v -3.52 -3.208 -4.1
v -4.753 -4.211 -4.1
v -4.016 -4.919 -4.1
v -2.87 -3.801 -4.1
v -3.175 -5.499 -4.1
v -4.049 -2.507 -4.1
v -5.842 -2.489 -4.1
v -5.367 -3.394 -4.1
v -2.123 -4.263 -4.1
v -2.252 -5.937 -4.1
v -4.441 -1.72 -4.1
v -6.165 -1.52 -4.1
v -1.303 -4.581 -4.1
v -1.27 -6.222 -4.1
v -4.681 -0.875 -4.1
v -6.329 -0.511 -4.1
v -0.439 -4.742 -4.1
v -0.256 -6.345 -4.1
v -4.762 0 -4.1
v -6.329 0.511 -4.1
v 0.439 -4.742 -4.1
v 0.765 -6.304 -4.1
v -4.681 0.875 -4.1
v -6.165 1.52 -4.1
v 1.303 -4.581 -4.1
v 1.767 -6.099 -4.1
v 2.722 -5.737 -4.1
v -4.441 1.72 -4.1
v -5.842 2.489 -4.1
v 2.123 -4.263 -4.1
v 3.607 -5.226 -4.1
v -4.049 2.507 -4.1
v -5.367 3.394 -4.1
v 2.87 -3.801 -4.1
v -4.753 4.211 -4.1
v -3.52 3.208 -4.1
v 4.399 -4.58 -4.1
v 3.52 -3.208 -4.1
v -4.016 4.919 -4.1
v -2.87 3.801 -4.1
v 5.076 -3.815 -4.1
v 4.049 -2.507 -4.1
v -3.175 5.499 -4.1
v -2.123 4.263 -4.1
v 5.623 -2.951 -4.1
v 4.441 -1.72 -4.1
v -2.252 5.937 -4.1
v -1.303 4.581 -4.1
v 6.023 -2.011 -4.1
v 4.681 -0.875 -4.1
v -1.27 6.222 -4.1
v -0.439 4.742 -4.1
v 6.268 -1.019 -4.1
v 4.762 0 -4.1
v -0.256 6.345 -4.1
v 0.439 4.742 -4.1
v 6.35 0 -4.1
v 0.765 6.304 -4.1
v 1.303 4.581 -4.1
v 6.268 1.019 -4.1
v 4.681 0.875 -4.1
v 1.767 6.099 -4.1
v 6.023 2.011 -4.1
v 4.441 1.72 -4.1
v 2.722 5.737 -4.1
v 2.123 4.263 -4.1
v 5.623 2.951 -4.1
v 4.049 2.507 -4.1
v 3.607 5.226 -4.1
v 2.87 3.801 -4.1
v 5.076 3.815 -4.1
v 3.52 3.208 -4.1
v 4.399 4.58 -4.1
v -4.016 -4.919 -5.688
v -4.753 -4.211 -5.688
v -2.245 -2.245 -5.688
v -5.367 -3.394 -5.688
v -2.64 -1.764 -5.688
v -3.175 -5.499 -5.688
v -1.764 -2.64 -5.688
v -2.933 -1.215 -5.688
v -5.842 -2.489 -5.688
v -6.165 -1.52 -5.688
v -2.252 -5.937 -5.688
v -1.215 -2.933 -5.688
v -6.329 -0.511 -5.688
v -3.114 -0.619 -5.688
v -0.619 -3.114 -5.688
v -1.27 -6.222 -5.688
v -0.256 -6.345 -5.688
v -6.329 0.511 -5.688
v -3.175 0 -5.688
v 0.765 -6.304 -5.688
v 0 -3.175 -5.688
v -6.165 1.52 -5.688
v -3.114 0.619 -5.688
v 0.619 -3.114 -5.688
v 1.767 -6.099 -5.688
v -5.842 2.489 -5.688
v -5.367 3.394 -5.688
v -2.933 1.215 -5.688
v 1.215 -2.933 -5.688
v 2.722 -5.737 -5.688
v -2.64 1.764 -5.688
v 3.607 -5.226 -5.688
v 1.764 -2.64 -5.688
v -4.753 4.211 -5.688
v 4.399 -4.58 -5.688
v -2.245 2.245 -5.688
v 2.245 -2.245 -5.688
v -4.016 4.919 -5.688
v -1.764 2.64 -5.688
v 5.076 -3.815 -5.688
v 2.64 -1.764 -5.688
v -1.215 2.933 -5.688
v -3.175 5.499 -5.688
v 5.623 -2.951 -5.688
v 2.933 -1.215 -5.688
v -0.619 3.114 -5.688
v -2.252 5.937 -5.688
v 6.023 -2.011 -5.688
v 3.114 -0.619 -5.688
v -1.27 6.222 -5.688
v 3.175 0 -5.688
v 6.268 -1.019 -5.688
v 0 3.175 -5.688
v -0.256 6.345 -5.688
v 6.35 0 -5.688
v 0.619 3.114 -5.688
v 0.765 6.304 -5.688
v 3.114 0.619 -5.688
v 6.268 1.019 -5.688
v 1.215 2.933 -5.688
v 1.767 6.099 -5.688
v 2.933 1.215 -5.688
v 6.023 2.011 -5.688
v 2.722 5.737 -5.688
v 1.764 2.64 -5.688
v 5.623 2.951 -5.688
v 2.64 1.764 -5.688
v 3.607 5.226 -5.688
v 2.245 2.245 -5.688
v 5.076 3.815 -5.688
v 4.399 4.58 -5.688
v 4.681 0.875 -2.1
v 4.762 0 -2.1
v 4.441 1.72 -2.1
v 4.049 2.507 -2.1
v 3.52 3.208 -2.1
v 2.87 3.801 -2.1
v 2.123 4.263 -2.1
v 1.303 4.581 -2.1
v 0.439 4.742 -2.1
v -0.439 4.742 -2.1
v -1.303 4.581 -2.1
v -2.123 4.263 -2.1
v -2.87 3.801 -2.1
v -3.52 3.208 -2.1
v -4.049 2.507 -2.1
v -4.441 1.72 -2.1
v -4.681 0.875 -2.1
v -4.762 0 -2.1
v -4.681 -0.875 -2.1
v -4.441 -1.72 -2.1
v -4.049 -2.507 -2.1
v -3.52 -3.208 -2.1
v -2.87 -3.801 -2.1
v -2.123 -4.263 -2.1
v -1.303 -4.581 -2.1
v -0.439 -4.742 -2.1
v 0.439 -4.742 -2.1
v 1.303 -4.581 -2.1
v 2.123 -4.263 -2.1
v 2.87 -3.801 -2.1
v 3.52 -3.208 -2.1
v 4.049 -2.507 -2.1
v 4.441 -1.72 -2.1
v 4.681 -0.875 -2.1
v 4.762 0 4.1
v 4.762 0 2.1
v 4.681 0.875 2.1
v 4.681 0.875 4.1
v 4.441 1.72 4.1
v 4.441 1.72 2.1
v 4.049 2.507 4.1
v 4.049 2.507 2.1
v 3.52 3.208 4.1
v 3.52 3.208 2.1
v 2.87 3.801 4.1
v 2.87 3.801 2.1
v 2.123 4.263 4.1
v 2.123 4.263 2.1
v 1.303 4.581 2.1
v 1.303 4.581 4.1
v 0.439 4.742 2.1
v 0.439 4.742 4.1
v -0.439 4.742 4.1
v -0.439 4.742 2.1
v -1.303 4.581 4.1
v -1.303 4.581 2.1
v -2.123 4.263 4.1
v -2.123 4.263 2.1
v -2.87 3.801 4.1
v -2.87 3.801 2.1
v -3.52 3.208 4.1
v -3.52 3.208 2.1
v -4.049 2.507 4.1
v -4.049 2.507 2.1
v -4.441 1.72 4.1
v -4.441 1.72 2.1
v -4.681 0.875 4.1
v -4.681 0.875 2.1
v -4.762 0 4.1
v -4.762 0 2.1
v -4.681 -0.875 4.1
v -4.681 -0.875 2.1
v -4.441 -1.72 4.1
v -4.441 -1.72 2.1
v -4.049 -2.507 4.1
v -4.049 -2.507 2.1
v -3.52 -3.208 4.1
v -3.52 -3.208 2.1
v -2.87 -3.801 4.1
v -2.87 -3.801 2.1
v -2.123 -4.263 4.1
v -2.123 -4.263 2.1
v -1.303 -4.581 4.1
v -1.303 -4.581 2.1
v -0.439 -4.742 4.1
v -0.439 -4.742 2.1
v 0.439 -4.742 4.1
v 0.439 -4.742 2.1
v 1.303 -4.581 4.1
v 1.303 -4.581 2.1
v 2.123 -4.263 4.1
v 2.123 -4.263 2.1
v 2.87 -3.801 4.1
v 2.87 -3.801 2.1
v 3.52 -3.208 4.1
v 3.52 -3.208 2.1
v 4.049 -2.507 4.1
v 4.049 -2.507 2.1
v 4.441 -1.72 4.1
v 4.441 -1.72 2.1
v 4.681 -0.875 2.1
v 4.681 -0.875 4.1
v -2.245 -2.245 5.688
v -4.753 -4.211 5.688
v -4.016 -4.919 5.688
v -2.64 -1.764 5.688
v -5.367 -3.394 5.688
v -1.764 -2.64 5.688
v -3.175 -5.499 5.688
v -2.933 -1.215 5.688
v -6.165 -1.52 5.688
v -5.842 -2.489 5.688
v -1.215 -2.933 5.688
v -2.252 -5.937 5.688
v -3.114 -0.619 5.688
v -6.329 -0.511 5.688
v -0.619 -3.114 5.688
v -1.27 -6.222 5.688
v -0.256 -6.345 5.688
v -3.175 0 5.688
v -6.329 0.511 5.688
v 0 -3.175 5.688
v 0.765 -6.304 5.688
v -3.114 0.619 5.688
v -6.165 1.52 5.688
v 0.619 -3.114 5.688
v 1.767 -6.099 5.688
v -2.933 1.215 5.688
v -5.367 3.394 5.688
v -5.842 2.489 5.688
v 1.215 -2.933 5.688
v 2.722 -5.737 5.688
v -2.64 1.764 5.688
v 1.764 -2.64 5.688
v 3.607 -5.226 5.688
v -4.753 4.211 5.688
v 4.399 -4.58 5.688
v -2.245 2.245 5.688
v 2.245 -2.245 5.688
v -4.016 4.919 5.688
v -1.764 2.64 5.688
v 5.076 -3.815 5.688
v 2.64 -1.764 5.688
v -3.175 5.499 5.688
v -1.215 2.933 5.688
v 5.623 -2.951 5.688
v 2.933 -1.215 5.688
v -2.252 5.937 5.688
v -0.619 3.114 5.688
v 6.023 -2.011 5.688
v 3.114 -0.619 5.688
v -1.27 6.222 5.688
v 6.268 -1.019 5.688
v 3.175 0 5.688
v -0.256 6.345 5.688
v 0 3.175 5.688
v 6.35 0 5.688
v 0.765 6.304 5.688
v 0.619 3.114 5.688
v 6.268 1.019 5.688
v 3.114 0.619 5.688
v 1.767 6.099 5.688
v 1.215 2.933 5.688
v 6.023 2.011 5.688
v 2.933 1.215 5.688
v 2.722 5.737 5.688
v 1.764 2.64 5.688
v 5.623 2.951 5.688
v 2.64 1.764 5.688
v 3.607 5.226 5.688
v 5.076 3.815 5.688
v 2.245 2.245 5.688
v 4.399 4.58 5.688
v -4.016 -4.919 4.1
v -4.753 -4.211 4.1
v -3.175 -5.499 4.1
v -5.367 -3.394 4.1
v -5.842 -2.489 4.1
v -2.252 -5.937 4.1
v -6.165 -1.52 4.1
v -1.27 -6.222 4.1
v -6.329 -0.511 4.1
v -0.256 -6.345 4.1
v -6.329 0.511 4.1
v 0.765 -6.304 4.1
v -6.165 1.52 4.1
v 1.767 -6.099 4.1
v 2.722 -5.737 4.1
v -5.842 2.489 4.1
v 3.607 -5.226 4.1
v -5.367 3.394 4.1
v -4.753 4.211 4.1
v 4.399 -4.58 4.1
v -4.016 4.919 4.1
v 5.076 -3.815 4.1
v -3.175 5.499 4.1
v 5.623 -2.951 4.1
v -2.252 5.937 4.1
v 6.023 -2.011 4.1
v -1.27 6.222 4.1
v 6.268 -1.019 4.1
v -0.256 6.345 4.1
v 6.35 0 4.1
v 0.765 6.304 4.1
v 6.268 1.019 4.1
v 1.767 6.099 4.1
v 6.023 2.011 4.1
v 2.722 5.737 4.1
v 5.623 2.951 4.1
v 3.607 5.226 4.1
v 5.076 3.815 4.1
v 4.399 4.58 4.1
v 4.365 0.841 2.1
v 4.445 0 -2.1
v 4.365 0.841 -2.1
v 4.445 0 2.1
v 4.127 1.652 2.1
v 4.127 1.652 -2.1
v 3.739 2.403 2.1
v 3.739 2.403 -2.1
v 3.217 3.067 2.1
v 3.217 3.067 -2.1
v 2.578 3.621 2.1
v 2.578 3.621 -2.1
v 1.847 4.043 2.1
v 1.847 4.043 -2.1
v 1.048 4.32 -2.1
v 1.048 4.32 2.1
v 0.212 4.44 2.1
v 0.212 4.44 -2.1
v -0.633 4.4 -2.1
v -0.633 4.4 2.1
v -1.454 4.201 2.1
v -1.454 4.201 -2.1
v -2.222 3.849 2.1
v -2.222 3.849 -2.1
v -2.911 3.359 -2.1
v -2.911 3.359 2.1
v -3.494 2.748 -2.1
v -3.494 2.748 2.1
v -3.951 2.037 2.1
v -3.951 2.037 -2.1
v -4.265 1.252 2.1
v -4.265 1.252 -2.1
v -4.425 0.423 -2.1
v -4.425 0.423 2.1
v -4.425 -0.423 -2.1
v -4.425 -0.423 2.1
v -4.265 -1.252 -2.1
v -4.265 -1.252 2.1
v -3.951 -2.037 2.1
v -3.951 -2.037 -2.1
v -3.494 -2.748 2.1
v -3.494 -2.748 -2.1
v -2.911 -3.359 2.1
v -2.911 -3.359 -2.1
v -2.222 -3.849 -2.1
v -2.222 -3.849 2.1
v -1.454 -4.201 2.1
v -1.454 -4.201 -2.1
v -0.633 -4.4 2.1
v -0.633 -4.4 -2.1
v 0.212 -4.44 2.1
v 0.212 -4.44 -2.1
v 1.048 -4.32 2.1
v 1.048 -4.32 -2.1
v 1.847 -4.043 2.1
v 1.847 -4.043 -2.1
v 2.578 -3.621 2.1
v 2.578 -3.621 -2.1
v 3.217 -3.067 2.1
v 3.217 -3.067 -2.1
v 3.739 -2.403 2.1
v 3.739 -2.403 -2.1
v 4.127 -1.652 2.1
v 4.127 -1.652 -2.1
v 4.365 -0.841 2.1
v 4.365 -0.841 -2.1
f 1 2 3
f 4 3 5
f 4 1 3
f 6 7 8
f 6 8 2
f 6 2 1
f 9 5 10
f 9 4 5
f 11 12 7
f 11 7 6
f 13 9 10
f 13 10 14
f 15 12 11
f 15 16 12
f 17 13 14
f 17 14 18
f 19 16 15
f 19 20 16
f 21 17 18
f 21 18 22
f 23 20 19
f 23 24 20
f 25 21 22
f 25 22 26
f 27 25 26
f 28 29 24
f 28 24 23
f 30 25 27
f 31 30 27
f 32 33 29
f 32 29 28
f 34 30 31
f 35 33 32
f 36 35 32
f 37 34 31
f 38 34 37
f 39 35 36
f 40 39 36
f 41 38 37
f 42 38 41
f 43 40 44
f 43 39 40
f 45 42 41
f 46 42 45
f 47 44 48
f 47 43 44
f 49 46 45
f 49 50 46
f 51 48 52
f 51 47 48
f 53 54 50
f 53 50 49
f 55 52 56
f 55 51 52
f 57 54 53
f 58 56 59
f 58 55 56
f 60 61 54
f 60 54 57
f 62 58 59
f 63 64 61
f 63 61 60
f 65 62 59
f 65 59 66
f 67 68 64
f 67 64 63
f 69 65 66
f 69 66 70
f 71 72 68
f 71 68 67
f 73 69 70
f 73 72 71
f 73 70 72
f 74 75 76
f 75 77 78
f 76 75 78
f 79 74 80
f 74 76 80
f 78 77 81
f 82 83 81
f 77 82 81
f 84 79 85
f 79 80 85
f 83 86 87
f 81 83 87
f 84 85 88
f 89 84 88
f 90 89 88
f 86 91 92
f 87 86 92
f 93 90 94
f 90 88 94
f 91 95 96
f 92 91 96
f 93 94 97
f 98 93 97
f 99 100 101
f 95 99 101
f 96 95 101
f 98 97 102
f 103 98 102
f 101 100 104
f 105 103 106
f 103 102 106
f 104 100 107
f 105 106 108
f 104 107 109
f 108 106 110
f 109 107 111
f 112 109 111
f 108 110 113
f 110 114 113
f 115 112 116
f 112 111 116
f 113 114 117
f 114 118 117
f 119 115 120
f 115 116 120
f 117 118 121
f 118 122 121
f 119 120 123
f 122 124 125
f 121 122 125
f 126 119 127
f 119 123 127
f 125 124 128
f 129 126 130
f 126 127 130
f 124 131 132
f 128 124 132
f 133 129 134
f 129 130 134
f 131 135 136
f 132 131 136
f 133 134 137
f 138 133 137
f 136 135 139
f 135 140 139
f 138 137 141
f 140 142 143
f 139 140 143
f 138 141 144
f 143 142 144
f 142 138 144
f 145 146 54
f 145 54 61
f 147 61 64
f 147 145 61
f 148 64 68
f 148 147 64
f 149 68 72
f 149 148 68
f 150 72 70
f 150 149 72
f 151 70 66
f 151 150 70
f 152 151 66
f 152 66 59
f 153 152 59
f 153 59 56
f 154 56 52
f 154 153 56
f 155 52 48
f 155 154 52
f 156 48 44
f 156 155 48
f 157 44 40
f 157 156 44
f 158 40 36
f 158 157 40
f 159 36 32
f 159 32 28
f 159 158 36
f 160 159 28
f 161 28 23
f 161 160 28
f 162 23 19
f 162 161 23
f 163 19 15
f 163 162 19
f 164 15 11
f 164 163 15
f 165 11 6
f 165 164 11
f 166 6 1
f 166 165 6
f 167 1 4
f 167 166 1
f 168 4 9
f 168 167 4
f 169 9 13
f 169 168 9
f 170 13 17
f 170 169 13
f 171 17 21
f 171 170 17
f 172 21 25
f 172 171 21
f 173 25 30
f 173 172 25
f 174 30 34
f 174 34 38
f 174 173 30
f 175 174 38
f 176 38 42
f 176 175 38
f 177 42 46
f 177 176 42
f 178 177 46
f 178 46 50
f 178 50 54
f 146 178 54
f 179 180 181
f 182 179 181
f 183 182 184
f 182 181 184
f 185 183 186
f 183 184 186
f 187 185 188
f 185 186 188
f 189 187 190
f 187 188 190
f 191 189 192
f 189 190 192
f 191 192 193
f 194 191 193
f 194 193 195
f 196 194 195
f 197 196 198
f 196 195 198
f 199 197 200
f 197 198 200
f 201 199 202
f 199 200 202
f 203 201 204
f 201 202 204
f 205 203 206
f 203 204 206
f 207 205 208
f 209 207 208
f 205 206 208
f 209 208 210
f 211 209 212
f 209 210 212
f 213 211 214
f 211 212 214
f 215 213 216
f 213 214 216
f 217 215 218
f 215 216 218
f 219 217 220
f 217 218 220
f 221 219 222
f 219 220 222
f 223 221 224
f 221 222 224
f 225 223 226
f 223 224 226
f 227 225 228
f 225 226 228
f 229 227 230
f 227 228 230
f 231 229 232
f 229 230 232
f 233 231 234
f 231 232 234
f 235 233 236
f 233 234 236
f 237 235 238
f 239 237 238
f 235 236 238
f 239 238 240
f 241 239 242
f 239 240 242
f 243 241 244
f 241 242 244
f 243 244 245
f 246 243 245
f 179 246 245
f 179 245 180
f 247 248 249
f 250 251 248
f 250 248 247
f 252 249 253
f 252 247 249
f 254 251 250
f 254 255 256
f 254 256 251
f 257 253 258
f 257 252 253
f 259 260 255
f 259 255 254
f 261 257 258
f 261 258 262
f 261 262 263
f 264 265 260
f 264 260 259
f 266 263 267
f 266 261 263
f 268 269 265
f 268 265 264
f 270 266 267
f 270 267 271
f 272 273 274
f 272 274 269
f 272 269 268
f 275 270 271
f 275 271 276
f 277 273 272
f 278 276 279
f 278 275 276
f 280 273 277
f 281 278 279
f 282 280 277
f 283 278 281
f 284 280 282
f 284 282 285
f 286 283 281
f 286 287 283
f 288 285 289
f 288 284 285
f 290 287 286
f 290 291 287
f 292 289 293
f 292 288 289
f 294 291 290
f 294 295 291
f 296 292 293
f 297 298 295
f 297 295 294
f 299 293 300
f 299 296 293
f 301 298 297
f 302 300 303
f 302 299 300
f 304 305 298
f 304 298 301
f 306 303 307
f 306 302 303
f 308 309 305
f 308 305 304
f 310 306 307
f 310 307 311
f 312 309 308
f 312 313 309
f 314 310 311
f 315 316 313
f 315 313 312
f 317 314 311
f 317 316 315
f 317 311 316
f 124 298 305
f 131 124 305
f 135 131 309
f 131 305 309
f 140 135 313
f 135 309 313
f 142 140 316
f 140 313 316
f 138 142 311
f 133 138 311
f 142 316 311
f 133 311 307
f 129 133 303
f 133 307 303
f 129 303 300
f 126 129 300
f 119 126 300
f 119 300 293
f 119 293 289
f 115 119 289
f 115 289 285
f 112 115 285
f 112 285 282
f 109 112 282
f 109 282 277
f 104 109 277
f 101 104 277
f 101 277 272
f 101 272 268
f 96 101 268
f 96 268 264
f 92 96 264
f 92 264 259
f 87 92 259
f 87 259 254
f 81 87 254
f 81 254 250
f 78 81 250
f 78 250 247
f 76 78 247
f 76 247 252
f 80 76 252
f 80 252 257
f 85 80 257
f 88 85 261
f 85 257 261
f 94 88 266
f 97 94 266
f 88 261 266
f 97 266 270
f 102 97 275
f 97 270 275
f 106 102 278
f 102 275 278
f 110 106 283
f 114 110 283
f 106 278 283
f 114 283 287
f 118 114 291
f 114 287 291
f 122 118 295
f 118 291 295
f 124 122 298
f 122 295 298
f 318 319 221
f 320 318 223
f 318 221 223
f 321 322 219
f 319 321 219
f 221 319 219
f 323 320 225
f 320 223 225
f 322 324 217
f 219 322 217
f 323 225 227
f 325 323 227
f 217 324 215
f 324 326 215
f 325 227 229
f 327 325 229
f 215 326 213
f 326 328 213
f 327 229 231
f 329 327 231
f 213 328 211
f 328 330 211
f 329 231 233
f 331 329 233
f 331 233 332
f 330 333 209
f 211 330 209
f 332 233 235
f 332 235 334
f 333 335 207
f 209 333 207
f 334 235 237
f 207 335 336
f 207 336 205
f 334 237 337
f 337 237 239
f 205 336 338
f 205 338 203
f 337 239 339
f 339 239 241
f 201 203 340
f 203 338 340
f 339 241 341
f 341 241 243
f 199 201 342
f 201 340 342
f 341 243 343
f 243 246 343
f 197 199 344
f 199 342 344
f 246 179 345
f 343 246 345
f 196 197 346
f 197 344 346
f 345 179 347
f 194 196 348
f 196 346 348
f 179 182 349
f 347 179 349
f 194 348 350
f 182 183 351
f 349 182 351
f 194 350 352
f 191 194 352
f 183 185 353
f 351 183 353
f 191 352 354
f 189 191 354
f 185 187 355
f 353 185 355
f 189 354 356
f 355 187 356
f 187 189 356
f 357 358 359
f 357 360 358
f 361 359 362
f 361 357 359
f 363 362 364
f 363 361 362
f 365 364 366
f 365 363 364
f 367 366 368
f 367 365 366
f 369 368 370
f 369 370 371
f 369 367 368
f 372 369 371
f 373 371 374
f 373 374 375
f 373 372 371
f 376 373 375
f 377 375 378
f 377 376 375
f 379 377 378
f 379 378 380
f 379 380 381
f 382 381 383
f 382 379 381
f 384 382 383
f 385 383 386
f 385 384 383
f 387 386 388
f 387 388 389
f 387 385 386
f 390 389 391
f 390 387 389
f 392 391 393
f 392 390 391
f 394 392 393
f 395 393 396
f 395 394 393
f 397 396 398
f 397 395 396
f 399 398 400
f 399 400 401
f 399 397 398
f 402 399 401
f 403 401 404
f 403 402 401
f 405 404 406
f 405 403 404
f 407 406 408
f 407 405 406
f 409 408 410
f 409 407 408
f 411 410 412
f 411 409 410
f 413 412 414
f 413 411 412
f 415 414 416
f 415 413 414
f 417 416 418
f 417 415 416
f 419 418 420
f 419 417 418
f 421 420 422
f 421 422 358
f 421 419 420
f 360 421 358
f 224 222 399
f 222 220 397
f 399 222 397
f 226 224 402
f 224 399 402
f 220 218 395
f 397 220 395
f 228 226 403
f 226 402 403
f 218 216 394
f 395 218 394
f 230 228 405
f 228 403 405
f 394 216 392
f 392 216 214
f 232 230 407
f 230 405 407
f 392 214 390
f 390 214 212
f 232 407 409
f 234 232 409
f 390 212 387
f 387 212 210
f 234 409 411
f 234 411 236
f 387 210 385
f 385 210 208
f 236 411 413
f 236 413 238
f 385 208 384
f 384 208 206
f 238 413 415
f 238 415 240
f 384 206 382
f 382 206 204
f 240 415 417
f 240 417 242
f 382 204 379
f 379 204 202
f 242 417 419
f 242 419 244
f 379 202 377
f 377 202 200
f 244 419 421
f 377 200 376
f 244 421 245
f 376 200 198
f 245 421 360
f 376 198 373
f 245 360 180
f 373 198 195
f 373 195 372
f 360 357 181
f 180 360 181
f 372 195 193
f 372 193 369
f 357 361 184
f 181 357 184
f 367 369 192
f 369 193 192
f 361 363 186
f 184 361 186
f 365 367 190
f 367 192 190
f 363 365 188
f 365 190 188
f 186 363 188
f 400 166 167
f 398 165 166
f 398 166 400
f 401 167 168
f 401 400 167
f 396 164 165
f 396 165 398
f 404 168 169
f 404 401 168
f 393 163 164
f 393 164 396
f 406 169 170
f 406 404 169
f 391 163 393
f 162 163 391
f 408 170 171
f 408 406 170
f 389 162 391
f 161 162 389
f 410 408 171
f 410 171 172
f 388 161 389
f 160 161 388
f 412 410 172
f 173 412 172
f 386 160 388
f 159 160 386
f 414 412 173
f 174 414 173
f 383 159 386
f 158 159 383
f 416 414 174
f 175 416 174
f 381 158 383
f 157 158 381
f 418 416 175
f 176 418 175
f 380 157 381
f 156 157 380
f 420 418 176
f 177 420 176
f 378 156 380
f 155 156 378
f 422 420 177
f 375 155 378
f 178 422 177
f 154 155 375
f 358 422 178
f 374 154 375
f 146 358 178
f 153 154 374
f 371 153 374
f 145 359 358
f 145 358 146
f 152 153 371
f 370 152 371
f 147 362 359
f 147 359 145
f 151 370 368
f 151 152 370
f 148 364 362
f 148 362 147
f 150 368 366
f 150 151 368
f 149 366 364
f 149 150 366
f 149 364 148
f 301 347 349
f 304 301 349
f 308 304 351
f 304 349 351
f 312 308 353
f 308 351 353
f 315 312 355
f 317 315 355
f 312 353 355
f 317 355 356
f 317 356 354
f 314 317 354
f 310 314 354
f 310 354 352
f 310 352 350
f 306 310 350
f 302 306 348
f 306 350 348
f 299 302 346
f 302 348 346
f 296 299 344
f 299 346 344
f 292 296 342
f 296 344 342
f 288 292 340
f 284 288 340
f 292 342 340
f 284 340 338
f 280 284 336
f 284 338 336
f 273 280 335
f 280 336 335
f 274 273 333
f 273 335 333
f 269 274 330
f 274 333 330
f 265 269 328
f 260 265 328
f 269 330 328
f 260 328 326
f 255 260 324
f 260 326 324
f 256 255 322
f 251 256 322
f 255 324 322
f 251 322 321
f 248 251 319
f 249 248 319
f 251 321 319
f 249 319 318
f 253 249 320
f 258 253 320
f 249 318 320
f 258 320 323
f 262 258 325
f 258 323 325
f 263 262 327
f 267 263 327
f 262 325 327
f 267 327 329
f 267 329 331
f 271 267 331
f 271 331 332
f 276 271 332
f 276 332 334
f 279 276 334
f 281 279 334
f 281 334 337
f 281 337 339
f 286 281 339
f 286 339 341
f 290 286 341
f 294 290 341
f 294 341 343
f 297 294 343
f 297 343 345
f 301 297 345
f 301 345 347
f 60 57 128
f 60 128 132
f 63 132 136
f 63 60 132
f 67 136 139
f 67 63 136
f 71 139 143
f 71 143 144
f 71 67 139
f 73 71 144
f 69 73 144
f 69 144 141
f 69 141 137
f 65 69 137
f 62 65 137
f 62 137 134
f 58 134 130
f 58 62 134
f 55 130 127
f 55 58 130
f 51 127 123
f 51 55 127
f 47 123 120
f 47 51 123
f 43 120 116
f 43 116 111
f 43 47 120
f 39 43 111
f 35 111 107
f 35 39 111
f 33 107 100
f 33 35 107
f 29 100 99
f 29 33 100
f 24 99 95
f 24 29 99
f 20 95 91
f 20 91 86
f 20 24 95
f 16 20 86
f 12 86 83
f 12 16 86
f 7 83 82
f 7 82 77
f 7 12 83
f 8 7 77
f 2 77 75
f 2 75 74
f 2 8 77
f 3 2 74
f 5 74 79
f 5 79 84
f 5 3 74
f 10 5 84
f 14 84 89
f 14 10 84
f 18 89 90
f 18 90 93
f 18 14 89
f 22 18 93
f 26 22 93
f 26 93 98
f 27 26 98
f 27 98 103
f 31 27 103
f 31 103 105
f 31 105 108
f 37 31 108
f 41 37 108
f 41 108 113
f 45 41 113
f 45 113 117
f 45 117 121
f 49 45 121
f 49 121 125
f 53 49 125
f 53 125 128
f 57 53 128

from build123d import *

# Parameters (mm, degrees)
SKETCH1_R           = 4.445
BOSS_EXTRUDE1_DEPTH = 2.1
SKETCH2_R           = 4.7625
BOSS_EXTRUDE2_DEPTH = 2
SKETCH4_R           = 6.35
BOSS_EXTRUDE4_DEPTH = 1.5875
SKETCH5_R           = 3.175
CUT_EXTRUDE1_DEPTH  = 12.375


with BuildPart() as part:
    # Sketch1 → Boss-Extrude1 (new body)
    with BuildSketch(Plane.XY):
        Circle(SKETCH1_R)
    boss_extrude1 = extrude(amount=BOSS_EXTRUDE1_DEPTH)

    # Sketch2 → Boss-Extrude2 (add)
    with BuildSketch(Plane.XY.offset(2.1)):
        Circle(SKETCH2_R)
    boss_extrude2 = extrude(amount=BOSS_EXTRUDE2_DEPTH)

    # Sketch4 → Boss-Extrude4 (add)
    with BuildSketch(Plane.XY.offset(4.1)):
        Circle(SKETCH4_R)
    boss_extrude4 = extrude(amount=BOSS_EXTRUDE4_DEPTH)

    # Mirror1: Boss-Extrude1, Boss-Extrude2, Boss-Extrude4 across plane
    add(boss_extrude1.mirror(Plane.XY))
    add(boss_extrude2.mirror(Plane.XY))
    add(boss_extrude4.mirror(Plane.XY))

    # Sketch5 → Cut-Extrude1 (cut, through all)
    with BuildSketch(Plane.XY.offset(5.6875)):
        Circle(SKETCH5_R)
    extrude(amount=-CUT_EXTRUDE1_DEPTH, mode=Mode.SUBTRACT)


solid = part.part
